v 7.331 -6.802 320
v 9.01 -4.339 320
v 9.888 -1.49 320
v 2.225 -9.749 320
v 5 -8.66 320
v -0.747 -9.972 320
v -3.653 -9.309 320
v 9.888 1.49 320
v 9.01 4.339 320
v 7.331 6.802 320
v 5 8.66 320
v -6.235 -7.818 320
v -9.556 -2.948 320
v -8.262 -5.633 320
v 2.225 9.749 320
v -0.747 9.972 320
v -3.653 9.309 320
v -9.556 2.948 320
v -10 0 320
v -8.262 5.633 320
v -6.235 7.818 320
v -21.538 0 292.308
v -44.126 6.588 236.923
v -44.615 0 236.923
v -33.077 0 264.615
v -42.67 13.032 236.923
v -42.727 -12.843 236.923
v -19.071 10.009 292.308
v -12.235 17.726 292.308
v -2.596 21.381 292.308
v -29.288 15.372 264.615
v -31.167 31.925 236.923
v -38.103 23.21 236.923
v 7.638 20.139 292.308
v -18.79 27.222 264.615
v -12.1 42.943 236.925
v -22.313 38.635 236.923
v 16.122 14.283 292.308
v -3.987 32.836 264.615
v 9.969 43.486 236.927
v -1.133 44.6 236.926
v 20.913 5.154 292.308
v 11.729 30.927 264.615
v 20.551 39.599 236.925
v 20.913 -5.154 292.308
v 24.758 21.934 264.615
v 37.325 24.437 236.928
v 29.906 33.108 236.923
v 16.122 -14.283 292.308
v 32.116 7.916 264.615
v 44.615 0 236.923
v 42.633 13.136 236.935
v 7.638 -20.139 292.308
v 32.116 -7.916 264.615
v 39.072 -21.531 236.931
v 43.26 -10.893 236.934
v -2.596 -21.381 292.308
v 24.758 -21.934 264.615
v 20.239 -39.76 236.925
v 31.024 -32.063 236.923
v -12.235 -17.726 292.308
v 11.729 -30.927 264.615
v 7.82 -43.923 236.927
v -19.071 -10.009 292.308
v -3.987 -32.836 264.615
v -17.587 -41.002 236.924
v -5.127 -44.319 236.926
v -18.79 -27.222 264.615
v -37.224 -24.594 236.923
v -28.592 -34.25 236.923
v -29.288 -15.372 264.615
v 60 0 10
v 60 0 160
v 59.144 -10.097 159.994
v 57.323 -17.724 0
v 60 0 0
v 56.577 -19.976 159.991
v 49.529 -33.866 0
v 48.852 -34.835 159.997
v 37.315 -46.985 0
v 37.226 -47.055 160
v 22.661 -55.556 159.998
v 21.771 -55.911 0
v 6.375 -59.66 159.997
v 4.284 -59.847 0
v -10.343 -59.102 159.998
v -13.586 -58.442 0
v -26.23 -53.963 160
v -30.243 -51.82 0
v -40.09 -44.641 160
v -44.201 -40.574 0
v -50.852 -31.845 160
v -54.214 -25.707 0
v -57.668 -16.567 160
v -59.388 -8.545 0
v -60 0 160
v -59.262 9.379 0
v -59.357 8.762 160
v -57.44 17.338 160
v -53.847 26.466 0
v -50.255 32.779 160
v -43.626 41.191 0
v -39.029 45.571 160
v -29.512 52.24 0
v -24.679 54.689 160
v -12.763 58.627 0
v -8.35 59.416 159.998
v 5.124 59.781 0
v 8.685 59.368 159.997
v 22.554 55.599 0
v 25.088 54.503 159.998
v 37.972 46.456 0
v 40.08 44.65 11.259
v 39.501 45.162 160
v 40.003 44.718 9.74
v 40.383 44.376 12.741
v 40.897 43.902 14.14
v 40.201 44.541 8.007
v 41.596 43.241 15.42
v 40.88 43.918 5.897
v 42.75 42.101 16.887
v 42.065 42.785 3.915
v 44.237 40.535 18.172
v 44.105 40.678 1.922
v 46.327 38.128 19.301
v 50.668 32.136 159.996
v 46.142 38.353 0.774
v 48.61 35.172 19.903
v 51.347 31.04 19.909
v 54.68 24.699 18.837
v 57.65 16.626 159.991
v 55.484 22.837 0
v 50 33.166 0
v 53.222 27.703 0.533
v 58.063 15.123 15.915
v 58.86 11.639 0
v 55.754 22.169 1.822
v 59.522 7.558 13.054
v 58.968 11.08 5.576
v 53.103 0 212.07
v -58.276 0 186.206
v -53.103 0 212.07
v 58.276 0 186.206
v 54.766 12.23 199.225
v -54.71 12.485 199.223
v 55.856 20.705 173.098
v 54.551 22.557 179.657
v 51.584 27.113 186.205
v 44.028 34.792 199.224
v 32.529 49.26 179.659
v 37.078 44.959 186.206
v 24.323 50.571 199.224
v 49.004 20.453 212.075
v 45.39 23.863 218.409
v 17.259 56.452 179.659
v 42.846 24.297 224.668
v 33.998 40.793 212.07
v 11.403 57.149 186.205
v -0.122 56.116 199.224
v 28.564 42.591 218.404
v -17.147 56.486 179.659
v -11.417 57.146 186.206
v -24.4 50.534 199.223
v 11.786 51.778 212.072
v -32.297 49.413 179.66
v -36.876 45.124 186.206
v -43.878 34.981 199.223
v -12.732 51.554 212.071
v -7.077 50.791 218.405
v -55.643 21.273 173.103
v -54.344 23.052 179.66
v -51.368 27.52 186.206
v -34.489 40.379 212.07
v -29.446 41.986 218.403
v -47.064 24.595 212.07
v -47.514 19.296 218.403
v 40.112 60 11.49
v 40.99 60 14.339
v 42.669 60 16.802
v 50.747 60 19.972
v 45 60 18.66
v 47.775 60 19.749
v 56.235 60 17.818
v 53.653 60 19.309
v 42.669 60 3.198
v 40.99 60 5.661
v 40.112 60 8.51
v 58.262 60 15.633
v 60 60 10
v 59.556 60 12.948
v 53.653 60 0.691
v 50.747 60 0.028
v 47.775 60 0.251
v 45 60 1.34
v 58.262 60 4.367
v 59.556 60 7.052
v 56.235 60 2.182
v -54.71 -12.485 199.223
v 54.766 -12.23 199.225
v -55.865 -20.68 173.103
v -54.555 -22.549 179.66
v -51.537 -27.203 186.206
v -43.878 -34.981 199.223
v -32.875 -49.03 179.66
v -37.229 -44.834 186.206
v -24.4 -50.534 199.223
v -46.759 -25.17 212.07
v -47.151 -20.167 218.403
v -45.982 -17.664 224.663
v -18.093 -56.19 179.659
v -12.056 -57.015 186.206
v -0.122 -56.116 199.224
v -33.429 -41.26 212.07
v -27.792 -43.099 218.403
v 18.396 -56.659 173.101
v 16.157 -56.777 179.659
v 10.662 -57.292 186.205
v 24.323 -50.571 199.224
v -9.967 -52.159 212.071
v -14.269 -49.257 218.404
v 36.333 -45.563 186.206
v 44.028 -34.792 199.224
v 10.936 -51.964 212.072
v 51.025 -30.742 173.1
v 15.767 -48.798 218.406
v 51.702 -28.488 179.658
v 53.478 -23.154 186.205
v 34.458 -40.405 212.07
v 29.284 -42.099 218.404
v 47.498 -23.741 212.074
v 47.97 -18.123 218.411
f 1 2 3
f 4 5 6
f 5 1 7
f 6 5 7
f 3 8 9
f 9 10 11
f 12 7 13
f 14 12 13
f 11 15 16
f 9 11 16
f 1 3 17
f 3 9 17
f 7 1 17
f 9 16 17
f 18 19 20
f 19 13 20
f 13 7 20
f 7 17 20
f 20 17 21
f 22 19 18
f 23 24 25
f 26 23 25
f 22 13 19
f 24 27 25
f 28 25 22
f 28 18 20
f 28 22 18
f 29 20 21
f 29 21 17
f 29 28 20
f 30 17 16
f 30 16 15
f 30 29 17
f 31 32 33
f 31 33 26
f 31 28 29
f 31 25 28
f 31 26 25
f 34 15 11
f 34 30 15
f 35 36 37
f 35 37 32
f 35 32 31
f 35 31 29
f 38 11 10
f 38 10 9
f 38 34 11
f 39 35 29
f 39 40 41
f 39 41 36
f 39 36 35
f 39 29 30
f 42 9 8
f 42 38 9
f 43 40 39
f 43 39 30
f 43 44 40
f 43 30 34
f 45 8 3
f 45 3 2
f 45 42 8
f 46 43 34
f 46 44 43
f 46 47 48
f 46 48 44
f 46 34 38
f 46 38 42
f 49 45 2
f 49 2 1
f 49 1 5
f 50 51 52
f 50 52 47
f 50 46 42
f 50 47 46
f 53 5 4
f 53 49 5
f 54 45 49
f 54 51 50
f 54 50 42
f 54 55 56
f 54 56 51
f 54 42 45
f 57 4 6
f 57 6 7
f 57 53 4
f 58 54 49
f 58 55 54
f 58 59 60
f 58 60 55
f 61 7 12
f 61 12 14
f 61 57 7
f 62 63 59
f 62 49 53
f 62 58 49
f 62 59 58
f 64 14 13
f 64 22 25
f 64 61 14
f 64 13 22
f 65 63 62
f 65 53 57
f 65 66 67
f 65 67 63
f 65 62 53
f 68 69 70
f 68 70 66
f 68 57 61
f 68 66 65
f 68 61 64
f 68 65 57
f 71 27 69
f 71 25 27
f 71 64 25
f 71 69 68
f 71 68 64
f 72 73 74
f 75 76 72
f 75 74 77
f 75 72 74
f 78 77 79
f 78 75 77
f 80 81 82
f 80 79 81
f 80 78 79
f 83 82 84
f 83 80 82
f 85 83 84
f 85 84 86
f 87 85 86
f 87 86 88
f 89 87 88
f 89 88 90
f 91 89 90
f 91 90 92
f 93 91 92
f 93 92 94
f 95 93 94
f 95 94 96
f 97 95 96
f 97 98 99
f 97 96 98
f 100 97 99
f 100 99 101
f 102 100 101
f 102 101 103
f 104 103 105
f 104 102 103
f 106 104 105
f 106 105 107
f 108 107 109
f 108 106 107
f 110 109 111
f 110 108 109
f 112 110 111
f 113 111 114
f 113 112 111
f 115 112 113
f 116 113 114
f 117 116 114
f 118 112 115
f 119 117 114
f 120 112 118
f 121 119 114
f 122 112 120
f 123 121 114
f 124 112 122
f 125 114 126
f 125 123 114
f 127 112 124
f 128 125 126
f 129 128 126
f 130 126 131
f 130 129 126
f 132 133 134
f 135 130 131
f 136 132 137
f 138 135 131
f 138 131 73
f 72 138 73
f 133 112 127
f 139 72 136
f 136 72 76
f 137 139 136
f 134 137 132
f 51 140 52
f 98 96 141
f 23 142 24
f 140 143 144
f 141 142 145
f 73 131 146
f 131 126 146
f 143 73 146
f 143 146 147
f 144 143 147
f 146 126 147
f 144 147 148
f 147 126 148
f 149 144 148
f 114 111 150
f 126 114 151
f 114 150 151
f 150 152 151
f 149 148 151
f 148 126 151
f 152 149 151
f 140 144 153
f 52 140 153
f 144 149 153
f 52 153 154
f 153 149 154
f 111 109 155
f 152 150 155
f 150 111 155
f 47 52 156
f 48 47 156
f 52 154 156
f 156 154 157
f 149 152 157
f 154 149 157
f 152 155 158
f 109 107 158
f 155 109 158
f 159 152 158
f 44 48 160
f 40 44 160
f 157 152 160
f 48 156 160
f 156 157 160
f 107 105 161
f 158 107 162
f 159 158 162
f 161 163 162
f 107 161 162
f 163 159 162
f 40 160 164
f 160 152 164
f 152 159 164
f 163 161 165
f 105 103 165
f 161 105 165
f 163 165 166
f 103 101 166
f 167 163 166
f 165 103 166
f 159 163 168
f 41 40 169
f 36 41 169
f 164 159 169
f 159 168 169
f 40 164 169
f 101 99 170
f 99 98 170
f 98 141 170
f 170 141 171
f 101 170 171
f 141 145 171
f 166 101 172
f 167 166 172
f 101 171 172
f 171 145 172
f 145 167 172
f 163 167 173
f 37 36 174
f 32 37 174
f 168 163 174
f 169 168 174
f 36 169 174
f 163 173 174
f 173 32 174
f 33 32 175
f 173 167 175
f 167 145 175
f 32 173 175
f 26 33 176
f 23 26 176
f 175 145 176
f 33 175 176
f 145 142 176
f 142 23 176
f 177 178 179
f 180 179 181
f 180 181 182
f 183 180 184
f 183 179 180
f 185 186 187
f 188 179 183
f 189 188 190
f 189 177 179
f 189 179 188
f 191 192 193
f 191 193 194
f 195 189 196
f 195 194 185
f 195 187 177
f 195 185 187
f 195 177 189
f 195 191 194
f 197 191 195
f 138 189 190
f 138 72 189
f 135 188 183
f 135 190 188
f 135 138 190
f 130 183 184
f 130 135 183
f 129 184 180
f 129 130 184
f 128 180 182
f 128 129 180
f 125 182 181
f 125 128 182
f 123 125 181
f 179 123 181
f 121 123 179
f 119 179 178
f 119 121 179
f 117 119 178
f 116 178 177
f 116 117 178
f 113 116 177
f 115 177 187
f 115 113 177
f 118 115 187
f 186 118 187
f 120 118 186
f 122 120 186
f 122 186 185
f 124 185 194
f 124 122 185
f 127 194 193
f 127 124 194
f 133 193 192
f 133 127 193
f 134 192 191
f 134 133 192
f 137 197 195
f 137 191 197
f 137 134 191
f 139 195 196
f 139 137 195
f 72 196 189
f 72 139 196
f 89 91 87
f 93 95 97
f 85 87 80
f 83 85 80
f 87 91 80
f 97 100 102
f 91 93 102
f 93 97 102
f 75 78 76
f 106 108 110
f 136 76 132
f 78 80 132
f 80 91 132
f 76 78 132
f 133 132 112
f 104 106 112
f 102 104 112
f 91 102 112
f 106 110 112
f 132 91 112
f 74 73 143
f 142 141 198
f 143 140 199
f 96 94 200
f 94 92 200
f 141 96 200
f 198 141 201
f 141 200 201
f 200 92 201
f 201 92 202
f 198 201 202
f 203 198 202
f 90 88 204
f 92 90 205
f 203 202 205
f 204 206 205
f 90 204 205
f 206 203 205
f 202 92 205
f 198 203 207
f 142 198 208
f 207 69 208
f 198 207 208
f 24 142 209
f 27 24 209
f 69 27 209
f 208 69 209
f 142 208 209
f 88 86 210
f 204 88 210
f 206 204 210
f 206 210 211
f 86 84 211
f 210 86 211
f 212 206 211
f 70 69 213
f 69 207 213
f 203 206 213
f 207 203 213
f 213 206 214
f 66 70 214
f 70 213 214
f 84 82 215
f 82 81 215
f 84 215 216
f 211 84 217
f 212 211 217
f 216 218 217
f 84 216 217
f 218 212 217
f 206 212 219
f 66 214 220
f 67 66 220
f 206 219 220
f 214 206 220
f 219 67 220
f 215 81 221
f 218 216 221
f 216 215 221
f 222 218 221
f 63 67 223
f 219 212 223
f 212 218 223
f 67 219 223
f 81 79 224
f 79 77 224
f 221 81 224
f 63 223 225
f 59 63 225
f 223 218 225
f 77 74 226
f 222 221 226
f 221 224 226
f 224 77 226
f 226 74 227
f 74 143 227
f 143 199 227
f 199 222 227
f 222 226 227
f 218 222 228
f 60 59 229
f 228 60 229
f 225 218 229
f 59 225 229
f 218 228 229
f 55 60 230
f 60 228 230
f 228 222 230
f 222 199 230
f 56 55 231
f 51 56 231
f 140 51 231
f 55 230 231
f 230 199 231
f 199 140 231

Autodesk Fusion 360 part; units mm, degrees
sketch "Sketch1" plane through (0, 0, 0) normal (0, 0, 1) x (1, 0, 0)
  circle A0 centre (0, 0) radius 60
  dimension "d1" = 120
extrude "Extrude1" add sketch "Sketch1" along normal blind 200
sketch "Sketch2" plane through (0, 0, 0) normal (0, 1, 0) x (1, 0, 0)
  line L0 (70, -110) -> (70, -115.5379)
  line L1 (-60, -200) -> (-10, -320)
  line L2 (-10, -320) -> (0, -320)
  line L3 (0, -320) -> (0, -200)
  line L4 (0, -200) -> (-60, -200)
revolve "Revolve1" add sketch "Sketch2" angle 360 about axis through (0, 0, 320) along (0, 0, -1)
fillet "Fillet1" radius 200 1 edges at (-55.9396, -21.6969, 200)
sketch "Sketch4" plane through (0, 0, 0) normal (0, 1, 0) x (1, 0, 0)
  circle A0 centre (50, -10) radius 10
extrude "Extrude2" add sketch "Sketch4" along normal blind 60
